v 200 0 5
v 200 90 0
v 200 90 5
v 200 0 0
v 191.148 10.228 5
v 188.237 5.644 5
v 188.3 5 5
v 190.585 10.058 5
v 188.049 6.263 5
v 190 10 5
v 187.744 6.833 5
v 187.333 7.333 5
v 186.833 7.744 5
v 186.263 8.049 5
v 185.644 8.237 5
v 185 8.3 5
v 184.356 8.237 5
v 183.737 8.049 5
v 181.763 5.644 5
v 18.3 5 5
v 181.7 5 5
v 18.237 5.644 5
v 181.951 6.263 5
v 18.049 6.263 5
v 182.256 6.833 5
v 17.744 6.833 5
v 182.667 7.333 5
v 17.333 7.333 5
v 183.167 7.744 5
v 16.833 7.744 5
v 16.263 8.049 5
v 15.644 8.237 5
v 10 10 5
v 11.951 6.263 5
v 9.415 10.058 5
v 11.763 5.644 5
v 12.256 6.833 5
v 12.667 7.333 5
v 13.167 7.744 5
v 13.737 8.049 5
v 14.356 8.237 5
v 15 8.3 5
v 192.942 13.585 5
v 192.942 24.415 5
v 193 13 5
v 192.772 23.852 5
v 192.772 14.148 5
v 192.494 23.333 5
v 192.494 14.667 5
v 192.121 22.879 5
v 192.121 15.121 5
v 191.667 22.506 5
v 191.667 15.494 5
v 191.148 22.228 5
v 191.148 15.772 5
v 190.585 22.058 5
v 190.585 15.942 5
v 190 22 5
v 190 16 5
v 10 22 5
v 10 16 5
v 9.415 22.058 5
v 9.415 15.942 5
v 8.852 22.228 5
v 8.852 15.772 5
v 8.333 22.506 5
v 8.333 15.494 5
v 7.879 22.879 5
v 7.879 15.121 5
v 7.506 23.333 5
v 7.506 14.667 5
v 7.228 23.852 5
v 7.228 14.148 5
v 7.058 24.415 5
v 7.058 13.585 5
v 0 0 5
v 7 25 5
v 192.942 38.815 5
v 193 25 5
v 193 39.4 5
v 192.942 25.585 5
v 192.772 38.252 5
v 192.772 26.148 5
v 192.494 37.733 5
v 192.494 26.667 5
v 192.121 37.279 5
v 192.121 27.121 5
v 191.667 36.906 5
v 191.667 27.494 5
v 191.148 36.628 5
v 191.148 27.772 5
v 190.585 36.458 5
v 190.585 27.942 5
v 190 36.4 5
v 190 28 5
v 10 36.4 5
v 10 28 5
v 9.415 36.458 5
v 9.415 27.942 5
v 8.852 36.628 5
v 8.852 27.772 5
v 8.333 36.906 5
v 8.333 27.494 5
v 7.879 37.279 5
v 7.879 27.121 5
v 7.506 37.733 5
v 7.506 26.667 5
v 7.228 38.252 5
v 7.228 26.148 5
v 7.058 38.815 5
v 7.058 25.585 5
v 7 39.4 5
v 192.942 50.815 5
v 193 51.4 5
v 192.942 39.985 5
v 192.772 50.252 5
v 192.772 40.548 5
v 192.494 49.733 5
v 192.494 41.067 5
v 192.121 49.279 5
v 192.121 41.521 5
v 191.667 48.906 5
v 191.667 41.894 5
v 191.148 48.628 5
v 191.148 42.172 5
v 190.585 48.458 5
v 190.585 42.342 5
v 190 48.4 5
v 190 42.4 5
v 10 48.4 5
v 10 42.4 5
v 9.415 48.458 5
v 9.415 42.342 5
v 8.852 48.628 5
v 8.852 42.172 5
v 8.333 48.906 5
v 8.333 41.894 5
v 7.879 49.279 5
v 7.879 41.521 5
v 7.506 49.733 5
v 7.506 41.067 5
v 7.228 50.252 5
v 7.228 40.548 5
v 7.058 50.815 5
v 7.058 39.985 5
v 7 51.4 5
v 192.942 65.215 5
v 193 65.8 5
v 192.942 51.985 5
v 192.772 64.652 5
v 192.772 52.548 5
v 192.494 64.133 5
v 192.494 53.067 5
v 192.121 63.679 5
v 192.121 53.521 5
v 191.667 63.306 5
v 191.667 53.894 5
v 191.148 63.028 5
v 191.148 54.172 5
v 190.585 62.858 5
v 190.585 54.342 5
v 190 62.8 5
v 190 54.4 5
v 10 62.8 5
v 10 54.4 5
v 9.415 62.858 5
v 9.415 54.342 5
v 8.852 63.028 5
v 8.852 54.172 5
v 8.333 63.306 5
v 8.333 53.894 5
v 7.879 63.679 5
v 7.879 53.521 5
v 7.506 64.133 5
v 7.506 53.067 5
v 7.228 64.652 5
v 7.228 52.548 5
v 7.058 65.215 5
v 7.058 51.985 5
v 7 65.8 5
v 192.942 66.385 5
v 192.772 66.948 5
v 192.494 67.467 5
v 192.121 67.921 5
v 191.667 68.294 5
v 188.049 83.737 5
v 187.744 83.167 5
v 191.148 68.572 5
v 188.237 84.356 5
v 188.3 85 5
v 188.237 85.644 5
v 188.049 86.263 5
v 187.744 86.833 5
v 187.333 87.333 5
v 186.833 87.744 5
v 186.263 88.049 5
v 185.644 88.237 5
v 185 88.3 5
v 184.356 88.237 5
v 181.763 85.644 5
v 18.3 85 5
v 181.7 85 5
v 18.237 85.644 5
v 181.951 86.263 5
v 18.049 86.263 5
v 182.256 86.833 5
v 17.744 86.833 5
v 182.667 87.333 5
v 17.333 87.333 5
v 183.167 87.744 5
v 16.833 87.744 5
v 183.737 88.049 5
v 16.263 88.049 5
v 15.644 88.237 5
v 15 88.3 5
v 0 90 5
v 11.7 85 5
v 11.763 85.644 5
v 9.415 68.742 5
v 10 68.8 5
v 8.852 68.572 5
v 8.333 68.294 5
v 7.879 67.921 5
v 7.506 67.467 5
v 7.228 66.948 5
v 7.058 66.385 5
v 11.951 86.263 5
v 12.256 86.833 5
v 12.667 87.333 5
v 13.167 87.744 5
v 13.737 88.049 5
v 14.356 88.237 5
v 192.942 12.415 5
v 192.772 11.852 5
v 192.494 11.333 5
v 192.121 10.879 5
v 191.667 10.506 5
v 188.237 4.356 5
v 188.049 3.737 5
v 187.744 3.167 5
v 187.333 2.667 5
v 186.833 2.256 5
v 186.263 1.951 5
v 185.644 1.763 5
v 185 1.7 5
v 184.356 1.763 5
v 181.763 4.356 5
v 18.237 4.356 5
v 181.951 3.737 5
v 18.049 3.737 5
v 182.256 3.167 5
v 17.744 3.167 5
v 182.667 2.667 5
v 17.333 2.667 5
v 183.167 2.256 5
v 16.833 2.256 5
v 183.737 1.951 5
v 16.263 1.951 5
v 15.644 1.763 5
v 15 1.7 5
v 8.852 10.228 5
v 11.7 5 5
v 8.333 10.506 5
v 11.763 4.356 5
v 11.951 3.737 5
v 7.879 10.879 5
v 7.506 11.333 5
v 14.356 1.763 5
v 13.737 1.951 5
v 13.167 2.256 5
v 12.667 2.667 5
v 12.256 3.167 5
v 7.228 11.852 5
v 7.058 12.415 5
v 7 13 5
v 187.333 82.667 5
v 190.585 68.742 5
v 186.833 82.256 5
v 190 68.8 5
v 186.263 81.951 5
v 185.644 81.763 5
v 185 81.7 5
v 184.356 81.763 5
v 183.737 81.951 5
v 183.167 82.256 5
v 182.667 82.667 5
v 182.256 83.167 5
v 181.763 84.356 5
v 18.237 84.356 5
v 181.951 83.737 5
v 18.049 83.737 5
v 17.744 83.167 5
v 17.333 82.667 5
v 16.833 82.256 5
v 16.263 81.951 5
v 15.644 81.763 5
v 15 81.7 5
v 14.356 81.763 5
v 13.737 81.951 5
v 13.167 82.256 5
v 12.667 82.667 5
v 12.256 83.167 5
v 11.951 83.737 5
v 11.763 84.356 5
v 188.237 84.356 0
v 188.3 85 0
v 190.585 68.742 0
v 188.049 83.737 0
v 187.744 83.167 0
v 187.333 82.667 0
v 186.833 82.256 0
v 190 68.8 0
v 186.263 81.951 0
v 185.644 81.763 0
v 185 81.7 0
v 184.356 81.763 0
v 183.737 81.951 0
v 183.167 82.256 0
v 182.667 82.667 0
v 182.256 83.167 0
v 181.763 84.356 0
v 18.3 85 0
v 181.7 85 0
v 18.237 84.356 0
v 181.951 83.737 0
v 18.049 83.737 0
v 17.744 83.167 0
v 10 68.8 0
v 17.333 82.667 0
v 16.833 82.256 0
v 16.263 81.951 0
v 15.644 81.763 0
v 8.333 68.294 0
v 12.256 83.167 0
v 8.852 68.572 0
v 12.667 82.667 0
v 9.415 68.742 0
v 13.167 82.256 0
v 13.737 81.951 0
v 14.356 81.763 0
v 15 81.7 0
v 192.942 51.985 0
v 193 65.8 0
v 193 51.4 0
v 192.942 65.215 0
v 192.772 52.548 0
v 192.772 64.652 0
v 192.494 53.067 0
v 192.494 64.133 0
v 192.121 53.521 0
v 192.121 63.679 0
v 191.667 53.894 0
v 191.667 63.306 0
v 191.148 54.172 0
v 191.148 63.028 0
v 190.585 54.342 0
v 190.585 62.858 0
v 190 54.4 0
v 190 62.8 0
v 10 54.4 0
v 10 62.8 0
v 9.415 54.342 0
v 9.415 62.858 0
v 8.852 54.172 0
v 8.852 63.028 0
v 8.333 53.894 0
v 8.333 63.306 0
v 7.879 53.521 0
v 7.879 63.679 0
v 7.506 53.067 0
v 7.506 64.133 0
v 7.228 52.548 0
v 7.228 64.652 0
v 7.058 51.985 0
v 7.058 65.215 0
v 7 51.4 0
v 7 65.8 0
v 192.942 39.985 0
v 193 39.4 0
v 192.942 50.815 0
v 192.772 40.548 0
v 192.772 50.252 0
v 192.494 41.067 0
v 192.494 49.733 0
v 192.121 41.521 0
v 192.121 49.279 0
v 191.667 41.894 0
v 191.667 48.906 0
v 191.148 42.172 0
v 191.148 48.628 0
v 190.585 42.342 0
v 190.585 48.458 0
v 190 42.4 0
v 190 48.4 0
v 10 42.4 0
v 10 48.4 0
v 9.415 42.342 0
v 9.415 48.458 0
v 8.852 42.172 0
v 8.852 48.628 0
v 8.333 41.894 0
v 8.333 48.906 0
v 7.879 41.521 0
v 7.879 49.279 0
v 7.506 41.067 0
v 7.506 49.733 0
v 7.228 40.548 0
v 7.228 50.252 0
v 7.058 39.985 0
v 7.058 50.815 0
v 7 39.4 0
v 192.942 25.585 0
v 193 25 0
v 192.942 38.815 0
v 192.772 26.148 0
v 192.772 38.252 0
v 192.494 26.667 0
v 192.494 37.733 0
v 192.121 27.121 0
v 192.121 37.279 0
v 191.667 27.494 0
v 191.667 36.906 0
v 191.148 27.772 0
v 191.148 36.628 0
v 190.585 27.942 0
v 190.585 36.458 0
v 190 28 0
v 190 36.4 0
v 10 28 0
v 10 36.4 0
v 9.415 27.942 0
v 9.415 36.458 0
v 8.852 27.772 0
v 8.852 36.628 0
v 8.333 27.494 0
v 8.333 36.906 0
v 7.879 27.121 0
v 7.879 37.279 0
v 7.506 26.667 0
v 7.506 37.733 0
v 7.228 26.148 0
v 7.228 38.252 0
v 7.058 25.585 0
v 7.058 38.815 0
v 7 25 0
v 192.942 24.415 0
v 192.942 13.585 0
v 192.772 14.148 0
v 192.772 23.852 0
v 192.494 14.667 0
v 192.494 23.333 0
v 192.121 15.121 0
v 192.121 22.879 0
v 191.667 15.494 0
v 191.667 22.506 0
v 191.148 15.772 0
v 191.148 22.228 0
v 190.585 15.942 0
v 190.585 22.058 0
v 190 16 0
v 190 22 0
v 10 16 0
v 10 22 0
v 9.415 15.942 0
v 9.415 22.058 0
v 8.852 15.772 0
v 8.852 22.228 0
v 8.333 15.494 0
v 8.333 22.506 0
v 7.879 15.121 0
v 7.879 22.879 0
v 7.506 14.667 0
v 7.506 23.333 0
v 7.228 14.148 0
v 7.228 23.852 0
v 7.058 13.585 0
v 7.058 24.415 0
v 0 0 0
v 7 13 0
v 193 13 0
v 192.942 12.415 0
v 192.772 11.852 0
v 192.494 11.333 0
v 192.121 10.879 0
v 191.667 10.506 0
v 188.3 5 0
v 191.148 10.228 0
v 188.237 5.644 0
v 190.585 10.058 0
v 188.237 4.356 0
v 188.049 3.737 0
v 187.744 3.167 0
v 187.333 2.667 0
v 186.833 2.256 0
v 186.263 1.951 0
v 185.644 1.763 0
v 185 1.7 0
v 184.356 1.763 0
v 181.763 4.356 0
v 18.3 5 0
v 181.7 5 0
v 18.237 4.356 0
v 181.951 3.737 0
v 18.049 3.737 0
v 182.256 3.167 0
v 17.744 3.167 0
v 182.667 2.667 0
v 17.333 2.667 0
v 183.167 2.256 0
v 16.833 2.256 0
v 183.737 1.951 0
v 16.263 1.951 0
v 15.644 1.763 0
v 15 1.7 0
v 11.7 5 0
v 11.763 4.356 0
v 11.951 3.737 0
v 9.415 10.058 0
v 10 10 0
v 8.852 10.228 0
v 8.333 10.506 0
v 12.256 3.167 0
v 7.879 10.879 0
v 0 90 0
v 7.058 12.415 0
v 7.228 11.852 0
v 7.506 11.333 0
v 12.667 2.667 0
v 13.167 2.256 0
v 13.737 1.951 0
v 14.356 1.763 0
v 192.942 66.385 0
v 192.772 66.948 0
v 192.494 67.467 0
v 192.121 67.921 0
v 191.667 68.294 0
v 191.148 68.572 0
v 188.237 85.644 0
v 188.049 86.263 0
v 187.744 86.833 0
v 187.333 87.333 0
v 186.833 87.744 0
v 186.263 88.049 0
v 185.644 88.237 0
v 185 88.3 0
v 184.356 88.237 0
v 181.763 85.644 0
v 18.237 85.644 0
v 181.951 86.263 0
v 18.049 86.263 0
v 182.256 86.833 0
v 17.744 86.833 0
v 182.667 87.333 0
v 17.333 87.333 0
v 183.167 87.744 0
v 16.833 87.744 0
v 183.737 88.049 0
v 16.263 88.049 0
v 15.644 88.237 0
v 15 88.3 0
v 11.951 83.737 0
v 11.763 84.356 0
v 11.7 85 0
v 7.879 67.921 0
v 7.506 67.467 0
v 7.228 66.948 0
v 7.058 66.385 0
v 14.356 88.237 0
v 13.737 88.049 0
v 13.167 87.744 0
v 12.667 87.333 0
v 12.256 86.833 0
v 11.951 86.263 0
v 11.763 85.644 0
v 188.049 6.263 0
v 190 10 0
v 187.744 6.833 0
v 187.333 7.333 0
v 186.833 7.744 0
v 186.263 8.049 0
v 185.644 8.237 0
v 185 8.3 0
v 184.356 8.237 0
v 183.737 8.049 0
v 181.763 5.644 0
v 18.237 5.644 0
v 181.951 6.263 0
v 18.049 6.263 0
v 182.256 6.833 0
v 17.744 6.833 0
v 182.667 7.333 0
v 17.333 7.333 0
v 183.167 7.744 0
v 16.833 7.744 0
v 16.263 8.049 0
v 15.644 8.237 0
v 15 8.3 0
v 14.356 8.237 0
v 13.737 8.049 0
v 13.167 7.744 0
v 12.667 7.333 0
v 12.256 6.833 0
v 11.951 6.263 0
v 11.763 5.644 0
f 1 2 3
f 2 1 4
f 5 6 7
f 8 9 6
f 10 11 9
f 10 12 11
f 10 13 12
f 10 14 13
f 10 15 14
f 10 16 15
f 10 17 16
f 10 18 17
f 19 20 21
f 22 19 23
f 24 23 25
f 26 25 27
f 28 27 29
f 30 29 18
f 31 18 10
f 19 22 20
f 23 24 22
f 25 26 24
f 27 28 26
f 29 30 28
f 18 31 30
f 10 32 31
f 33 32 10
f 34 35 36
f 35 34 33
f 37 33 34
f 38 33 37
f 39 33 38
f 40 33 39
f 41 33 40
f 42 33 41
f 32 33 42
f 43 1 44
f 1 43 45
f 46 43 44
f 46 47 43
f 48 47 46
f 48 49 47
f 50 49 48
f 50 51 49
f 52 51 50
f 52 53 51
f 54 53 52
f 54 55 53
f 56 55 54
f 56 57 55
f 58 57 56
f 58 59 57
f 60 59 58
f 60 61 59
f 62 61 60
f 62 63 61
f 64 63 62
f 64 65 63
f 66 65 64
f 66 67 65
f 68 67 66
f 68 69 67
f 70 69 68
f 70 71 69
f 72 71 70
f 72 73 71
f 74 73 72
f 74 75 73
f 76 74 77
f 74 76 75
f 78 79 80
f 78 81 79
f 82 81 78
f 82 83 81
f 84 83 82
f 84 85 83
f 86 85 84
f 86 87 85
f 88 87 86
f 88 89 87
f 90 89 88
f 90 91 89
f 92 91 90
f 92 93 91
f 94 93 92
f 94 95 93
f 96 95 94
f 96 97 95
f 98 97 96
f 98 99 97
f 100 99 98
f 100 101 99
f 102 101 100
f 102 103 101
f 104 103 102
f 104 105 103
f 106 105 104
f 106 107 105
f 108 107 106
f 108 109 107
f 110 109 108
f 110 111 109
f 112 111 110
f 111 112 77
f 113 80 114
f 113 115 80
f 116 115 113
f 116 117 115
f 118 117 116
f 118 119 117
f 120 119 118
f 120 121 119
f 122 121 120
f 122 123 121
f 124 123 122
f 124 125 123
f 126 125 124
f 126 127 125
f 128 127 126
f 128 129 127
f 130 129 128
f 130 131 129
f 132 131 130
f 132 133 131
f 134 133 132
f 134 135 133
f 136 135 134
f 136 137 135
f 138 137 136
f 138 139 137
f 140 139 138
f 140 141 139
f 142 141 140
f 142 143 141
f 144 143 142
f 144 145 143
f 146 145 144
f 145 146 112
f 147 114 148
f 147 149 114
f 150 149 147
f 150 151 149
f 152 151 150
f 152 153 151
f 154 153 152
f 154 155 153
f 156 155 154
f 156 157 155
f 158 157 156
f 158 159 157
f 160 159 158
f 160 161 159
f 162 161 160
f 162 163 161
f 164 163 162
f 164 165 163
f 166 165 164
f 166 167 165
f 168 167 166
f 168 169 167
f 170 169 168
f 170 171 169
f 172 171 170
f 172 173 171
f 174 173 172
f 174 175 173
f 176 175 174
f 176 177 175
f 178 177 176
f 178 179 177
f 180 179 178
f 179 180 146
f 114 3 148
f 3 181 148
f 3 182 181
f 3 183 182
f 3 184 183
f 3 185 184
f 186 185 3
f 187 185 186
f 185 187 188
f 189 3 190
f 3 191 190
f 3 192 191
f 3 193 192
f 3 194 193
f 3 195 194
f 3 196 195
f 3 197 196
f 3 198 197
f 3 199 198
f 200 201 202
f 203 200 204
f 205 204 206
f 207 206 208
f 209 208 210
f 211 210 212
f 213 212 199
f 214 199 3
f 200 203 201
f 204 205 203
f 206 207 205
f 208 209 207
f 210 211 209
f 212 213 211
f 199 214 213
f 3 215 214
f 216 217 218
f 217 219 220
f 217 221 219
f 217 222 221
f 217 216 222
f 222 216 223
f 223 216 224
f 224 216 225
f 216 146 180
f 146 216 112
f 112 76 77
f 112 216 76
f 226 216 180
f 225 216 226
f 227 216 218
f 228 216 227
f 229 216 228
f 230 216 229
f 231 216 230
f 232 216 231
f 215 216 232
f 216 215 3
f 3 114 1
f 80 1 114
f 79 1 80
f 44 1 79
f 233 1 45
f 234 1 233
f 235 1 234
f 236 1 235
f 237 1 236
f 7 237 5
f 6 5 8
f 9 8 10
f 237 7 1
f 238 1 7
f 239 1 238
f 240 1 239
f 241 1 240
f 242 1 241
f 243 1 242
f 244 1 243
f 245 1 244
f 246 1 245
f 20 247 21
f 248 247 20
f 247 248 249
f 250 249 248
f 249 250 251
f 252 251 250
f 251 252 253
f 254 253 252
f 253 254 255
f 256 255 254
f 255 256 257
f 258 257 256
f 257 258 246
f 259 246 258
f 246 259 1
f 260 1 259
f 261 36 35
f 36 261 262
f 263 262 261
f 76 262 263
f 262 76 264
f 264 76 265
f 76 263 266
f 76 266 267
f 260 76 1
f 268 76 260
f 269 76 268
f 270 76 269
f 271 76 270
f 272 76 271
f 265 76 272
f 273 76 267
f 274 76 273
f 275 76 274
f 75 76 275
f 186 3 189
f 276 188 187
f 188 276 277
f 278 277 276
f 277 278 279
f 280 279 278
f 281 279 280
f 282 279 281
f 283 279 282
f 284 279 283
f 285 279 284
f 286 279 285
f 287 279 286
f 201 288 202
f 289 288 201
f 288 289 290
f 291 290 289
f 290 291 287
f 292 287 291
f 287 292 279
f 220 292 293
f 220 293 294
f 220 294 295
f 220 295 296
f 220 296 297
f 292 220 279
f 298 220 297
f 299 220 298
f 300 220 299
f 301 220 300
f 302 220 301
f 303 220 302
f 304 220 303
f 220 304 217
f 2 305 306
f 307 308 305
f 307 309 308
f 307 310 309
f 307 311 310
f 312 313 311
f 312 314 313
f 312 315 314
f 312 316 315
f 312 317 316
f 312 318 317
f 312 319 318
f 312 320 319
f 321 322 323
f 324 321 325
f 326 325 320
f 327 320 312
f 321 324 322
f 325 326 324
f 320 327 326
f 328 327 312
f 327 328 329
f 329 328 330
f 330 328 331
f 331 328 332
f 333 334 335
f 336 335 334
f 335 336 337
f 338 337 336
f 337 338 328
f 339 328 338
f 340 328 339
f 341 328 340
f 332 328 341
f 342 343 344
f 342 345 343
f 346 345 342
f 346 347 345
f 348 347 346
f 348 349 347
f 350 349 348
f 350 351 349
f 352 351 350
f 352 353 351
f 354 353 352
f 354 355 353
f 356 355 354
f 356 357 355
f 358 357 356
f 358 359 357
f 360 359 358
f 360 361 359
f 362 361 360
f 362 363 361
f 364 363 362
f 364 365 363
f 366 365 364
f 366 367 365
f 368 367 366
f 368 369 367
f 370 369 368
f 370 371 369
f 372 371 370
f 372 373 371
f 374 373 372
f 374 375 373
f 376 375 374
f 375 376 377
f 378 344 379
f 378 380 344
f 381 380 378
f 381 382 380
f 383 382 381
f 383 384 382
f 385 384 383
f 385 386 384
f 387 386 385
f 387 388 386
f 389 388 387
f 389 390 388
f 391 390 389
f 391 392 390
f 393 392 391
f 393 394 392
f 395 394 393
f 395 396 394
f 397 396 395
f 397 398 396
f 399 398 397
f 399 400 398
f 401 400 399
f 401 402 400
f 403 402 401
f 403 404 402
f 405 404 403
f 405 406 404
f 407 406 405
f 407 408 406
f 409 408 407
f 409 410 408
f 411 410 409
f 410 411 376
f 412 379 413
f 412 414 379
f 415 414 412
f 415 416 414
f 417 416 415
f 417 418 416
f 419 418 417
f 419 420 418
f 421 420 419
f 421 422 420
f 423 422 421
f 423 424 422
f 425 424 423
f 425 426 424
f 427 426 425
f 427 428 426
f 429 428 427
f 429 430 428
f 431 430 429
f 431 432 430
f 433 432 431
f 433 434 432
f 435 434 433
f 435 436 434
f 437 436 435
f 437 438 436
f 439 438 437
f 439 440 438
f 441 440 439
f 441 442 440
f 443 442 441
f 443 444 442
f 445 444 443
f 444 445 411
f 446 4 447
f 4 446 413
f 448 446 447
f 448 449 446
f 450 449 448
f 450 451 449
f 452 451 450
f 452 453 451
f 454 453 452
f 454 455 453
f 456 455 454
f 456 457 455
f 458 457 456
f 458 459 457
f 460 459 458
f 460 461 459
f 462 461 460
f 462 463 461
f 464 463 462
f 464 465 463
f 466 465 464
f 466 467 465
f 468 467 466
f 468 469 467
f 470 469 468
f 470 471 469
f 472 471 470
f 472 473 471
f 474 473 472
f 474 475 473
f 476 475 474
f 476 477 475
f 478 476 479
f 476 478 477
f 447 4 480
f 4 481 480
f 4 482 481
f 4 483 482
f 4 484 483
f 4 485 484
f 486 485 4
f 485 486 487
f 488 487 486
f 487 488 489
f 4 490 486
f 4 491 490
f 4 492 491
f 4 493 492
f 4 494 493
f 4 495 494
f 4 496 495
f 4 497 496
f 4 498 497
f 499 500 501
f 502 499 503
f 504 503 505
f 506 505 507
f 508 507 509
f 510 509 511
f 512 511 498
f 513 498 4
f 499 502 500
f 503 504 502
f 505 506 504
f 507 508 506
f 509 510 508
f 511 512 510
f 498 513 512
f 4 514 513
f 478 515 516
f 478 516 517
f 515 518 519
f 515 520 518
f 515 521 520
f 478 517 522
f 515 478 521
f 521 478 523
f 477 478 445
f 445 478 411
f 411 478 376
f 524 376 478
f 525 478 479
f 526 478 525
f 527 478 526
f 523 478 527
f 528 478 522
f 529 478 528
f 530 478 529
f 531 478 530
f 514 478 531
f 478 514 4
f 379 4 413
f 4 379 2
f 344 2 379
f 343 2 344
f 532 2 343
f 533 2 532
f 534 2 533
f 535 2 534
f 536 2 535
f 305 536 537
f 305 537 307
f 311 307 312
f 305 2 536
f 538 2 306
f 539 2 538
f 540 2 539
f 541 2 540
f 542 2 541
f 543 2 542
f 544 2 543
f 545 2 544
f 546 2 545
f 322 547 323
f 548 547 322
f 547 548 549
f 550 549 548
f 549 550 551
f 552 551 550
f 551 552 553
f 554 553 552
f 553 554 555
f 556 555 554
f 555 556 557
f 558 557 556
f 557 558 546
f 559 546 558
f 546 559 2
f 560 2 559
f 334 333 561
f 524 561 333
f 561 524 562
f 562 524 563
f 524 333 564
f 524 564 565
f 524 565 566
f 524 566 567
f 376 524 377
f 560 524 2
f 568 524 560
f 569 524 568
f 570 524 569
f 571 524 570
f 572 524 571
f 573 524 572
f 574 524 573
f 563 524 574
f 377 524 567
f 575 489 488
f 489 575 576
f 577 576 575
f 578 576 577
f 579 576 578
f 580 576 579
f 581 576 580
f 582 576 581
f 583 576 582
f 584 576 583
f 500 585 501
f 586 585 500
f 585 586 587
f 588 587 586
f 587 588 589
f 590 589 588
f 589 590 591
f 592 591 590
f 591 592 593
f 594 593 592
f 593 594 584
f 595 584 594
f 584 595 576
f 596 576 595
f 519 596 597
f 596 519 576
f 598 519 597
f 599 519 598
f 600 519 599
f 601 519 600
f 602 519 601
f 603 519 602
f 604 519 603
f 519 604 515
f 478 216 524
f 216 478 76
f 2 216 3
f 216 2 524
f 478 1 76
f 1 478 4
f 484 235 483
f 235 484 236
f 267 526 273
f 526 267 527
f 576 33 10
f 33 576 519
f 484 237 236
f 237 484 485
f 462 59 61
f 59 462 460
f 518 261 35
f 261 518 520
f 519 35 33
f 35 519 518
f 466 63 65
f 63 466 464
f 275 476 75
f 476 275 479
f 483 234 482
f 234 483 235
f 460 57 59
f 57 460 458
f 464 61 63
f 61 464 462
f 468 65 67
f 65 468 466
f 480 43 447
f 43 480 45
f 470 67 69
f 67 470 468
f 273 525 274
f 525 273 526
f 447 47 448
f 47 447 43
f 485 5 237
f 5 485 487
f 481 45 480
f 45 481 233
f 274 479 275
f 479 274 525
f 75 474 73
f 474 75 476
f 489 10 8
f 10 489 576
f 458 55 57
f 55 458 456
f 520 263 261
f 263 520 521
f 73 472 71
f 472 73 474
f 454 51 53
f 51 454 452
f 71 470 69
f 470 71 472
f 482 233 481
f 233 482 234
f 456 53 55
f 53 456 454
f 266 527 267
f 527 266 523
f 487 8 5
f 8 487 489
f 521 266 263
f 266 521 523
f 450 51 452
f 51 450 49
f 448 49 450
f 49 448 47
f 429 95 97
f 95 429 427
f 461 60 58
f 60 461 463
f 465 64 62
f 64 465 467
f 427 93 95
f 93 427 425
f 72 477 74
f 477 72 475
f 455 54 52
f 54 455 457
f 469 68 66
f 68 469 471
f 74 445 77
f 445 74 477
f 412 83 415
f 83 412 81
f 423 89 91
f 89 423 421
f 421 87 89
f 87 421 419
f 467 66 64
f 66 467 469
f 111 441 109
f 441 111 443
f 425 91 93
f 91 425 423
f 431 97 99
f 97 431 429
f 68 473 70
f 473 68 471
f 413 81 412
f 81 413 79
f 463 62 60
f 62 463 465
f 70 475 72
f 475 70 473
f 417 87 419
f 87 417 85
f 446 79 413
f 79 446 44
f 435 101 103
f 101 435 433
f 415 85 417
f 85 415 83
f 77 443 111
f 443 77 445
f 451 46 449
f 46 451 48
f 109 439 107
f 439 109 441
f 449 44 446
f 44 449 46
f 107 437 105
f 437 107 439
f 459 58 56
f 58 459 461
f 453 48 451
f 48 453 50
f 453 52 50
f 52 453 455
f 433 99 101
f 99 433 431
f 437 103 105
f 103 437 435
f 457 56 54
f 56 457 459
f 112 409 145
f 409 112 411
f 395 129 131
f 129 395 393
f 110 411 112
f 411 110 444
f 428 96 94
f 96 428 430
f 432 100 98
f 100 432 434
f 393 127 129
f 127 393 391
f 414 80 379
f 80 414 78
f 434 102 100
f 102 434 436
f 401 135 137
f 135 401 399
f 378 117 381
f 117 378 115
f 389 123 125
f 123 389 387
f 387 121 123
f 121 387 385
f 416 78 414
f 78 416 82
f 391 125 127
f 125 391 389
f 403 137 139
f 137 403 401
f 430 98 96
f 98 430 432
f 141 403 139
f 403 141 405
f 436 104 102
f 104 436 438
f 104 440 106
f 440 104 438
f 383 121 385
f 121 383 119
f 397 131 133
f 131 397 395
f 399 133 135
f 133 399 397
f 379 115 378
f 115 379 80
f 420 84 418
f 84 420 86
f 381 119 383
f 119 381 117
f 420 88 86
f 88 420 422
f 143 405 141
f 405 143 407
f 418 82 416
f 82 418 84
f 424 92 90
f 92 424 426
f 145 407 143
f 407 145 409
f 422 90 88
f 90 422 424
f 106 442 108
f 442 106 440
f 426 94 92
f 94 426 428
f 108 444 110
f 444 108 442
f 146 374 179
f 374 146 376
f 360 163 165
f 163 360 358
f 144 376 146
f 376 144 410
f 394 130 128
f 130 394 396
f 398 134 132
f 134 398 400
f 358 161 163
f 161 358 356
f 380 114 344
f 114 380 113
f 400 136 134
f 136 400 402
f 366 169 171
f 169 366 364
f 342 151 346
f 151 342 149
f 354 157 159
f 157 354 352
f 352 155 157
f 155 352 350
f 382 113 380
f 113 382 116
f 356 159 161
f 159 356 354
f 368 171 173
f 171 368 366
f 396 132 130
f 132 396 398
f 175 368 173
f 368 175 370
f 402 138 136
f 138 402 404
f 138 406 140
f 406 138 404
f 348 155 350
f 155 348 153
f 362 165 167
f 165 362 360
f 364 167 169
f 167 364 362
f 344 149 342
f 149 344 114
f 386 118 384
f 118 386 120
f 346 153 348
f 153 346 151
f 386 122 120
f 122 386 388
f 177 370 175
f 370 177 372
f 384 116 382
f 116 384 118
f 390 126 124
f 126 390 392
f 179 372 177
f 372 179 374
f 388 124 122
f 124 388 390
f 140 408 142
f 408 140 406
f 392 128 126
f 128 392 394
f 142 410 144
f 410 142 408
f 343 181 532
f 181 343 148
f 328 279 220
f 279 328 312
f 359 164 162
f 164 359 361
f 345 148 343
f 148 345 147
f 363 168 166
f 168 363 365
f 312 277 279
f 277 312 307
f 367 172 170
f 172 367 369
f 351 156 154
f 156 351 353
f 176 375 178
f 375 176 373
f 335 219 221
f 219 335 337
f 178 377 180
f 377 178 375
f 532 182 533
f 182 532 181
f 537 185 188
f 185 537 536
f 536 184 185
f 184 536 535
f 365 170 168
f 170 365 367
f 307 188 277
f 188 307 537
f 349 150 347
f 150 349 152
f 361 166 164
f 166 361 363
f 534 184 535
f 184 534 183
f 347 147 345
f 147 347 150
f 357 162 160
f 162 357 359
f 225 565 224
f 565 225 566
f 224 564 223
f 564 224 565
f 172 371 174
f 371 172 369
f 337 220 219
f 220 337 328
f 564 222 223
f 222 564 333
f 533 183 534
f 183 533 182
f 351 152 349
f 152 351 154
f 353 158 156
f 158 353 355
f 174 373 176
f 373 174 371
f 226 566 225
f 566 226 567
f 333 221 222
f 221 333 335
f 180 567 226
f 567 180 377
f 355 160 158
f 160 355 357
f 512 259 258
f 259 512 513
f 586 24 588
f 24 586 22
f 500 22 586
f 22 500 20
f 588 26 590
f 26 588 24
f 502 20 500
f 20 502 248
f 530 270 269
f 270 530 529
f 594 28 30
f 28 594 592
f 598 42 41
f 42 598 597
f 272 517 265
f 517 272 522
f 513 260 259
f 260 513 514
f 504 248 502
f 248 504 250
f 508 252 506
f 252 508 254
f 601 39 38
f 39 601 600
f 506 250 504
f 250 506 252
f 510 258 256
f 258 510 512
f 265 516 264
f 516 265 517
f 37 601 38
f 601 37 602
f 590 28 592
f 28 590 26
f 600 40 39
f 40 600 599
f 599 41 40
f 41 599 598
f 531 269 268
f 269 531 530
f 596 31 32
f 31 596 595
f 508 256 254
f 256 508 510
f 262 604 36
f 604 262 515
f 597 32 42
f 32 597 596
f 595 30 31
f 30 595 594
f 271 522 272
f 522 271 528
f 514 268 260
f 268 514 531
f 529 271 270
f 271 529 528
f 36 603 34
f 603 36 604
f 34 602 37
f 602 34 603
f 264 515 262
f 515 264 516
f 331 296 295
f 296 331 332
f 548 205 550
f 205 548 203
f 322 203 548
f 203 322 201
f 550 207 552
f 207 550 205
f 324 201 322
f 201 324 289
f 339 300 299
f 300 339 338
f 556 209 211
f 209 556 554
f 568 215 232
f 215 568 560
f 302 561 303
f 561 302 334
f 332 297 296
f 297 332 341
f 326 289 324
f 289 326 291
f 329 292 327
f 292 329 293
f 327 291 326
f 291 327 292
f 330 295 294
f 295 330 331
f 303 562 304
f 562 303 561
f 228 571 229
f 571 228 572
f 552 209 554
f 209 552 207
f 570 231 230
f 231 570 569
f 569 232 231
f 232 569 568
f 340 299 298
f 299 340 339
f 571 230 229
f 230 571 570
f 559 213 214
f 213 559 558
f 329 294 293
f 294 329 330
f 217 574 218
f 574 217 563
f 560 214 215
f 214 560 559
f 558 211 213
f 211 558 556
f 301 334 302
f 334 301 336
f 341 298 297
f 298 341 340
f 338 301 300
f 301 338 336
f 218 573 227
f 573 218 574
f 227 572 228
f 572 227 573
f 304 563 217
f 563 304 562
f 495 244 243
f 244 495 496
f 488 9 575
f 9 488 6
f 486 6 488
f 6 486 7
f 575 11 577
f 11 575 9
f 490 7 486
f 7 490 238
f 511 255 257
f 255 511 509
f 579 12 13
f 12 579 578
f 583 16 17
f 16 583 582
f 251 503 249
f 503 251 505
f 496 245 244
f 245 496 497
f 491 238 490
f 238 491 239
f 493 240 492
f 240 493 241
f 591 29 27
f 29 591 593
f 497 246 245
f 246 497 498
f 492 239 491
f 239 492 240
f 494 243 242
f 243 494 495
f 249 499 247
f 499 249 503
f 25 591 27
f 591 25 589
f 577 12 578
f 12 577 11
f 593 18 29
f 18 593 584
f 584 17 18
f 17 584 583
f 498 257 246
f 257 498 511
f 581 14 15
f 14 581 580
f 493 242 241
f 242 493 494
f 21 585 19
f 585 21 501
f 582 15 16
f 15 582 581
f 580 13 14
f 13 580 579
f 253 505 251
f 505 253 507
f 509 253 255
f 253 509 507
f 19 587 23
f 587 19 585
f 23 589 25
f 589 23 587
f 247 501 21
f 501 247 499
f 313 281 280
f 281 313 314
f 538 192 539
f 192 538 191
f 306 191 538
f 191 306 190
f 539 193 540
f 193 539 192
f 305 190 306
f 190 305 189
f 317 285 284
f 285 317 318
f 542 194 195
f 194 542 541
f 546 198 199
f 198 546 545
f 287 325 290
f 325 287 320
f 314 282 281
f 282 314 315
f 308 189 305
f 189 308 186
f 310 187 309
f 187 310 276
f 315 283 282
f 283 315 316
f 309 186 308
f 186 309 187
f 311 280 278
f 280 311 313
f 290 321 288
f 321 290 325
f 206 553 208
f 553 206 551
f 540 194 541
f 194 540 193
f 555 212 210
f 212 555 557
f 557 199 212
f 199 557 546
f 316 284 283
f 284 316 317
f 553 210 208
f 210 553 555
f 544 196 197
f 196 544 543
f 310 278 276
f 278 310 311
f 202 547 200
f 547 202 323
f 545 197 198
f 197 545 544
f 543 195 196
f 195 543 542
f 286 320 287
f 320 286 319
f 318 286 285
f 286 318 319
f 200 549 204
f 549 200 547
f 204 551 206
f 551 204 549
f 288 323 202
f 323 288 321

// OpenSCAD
$fn = 32;

// ----------------------------------------------------------------------
// Slotted panel: 200 x 90 mm, 5 рядов of slots
// ----------------------------------------------------------------------

// --- parameters (mm) ---
panel_w = 200;            // panel width
panel_d = 90;             // panel depth
thick = 5;                // panel thickness
slot_w = 6;               // slot width
pitch0 = 12;              // first row pitch
pitch_step = 2.4;         // pitch increase per row
margin = 10;              // margin around the slot field
rows = 5;                 // number of slot rows
mount_d = 6.6;            // mounting holes
mount_x = 85;             // mounting hole offset

difference() {
  union() {
    cube([panel_w, panel_d, thick]);
  }
  /* slot rows: stadium shaped cutters, 2.5 mm clear of both faces */
  /* row 0: pitch 12, length 180 */
  hull() {
    translate([10, 13, -2.5]) cylinder(h = thick + 5, d = slot_w);
    translate([190, 13, -2.5]) cylinder(h = thick + 5, d = slot_w);
  }
  /* row 1: pitch 14.4, length 180 */
  hull() {
    translate([10, 25, -2.5]) cylinder(h = thick + 5, d = slot_w);
    translate([190, 25, -2.5]) cylinder(h = thick + 5, d = slot_w);
  }
  /* row 2: pitch 12, length 180 */
  hull() {
    translate([10, 39.4, -2.5]) cylinder(h = thick + 5, d = slot_w);
    translate([190, 39.4, -2.5]) cylinder(h = thick + 5, d = slot_w);
  }
  /* row 3: pitch 14.4, length 180 */
  hull() {
    translate([10, 51.4, -2.5]) cylinder(h = thick + 5, d = slot_w);
    translate([190, 51.4, -2.5]) cylinder(h = thick + 5, d = slot_w);
  }
  /* row 4: pitch 12, length 180 */
  hull() {
    translate([10, 65.8, -2.5]) cylinder(h = thick + 5, d = slot_w);
    translate([190, 65.8, -2.5]) cylinder(h = thick + 5, d = slot_w);
  }
  translate([15, 5, -2.5]) cylinder(h = 10, d = mount_d);
  translate([15, 85, -2.5]) cylinder(h = 10, d = mount_d);
  translate([185, 5, -2.5]) cylinder(h = 10, d = mount_d);
  translate([185, 85, -2.5]) cylinder(h = 10, d = mount_d);
}
